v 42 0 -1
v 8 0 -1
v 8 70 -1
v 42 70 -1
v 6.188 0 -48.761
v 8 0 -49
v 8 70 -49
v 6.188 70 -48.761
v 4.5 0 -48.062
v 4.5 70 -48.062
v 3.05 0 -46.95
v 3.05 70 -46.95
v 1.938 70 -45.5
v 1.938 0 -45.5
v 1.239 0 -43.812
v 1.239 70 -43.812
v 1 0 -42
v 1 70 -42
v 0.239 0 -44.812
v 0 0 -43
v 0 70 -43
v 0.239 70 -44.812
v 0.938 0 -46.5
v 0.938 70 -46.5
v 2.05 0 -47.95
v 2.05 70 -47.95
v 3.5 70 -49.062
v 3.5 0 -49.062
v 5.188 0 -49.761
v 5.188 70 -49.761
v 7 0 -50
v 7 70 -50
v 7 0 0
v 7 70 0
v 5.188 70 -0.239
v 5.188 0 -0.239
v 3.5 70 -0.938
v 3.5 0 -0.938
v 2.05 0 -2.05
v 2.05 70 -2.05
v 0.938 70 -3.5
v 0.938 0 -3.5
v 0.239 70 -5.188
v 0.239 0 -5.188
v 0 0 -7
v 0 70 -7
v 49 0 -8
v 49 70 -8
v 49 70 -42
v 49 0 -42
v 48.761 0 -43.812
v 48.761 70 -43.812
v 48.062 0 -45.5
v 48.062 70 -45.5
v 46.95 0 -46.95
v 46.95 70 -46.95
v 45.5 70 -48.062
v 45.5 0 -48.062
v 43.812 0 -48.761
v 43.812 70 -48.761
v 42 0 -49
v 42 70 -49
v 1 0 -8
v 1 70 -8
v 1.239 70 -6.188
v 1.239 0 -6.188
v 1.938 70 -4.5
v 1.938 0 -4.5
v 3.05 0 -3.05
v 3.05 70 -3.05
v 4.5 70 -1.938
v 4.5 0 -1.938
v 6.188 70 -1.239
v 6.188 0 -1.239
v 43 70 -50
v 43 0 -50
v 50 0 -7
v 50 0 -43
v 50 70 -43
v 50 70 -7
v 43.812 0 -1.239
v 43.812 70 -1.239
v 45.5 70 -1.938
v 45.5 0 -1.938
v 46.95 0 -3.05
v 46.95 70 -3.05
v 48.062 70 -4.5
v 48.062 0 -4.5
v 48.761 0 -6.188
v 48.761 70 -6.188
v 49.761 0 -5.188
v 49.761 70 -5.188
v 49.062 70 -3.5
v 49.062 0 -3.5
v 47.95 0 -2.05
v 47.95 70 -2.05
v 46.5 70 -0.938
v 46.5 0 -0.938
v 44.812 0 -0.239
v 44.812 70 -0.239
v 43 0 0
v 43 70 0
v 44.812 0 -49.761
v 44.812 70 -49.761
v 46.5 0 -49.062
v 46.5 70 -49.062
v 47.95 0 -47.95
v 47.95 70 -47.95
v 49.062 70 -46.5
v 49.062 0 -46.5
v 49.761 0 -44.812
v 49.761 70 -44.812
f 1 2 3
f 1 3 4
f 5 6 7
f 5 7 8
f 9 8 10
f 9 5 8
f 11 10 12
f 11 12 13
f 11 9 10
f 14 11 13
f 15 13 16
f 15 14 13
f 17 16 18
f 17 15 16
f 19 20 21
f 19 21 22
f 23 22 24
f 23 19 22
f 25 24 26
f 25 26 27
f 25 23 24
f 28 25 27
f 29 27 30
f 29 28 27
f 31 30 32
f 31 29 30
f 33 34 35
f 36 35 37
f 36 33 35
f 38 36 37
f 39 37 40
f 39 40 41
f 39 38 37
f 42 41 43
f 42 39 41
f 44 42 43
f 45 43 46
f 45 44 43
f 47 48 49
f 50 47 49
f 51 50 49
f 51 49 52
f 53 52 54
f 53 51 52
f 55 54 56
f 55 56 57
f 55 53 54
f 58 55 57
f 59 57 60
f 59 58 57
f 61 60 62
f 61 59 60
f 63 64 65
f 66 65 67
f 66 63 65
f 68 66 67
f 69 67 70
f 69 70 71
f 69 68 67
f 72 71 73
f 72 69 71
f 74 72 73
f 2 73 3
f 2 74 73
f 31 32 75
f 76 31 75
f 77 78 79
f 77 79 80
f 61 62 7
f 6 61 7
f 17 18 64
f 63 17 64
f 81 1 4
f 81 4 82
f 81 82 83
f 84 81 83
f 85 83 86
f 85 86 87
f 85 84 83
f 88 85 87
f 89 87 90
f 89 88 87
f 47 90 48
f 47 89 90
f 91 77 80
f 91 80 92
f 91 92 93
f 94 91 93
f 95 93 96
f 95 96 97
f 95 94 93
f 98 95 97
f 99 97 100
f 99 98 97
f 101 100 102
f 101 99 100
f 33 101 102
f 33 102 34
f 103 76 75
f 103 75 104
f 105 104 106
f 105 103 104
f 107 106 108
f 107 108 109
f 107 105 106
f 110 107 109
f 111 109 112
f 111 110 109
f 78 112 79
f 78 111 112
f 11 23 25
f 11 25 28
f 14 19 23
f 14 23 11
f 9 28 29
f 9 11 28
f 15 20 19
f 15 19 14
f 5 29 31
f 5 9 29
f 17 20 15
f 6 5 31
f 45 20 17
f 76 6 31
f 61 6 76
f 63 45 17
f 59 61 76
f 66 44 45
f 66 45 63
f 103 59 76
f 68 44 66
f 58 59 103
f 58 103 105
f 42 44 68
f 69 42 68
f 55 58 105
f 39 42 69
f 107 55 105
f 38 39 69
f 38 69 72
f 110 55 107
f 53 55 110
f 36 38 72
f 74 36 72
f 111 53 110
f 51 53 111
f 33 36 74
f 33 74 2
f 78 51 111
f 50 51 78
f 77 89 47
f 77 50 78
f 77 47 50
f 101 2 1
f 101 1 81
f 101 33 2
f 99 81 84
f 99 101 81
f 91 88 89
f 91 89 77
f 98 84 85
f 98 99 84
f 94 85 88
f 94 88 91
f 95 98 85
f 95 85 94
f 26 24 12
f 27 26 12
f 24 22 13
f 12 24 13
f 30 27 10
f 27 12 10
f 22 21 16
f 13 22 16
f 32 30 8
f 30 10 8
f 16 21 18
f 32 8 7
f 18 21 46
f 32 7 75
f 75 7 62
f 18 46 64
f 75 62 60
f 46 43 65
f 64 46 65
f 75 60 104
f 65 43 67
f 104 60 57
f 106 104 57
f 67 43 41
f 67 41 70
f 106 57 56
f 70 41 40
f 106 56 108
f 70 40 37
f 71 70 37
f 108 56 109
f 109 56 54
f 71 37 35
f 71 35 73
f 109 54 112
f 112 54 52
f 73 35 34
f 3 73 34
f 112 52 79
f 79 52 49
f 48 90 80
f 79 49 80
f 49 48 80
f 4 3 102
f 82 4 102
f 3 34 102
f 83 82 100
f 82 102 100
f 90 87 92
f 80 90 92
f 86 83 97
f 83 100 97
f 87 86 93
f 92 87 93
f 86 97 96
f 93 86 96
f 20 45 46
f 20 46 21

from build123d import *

# Parameters (mm, degrees)
F1_DEPTH = 70
F2_ANGLE = 90


with BuildPart() as f1:
    # F0 (on Top) → F1 (new body)
    with BuildSketch(Plane.XY):
        with BuildLine():
            Line((43, 0), (7, 0))
            ThreePointArc((7, 0), (2.0502525317, -2.0502525317), (0, -7))
            Line((0, -7), (0, -43))
            ThreePointArc((0, -43), (2.0502525317, -47.9497474683), (7, -50))
            Line((7, -50), (43, -50))
            ThreePointArc((43, -50), (47.9497474683, -47.9497474683), (50, -43))
            Line((50, -43), (50, -7))
            ThreePointArc((50, -7), (47.9497474683, -2.0502525317), (43, 0))
        make_face()
        with BuildLine():
            ThreePointArc((1, -8), (3.0502525317, -3.0502525317), (8, -1))
            Line((8, -1), (42, -1))
            ThreePointArc((42, -1), (46.9497474683, -3.0502525317), (49, -8))
            Line((49, -8), (49, -42))
            ThreePointArc((49, -42), (46.9497474683, -46.9497474683), (42, -49))
            Line((42, -49), (8, -49))
            ThreePointArc((8, -49), (3.0502525317, -46.9497474683), (1, -42))
            Line((1, -42), (1, -8))
        make_face(mode=Mode.SUBTRACT)
    extrude(amount=-F1_DEPTH)


with BuildPart() as f1_1:
    # F2: moved
    add(f1.part.rotate(Axis((25, 0, 0), (1, 0, 0)), F2_ANGLE))


solid = f1_1.part
